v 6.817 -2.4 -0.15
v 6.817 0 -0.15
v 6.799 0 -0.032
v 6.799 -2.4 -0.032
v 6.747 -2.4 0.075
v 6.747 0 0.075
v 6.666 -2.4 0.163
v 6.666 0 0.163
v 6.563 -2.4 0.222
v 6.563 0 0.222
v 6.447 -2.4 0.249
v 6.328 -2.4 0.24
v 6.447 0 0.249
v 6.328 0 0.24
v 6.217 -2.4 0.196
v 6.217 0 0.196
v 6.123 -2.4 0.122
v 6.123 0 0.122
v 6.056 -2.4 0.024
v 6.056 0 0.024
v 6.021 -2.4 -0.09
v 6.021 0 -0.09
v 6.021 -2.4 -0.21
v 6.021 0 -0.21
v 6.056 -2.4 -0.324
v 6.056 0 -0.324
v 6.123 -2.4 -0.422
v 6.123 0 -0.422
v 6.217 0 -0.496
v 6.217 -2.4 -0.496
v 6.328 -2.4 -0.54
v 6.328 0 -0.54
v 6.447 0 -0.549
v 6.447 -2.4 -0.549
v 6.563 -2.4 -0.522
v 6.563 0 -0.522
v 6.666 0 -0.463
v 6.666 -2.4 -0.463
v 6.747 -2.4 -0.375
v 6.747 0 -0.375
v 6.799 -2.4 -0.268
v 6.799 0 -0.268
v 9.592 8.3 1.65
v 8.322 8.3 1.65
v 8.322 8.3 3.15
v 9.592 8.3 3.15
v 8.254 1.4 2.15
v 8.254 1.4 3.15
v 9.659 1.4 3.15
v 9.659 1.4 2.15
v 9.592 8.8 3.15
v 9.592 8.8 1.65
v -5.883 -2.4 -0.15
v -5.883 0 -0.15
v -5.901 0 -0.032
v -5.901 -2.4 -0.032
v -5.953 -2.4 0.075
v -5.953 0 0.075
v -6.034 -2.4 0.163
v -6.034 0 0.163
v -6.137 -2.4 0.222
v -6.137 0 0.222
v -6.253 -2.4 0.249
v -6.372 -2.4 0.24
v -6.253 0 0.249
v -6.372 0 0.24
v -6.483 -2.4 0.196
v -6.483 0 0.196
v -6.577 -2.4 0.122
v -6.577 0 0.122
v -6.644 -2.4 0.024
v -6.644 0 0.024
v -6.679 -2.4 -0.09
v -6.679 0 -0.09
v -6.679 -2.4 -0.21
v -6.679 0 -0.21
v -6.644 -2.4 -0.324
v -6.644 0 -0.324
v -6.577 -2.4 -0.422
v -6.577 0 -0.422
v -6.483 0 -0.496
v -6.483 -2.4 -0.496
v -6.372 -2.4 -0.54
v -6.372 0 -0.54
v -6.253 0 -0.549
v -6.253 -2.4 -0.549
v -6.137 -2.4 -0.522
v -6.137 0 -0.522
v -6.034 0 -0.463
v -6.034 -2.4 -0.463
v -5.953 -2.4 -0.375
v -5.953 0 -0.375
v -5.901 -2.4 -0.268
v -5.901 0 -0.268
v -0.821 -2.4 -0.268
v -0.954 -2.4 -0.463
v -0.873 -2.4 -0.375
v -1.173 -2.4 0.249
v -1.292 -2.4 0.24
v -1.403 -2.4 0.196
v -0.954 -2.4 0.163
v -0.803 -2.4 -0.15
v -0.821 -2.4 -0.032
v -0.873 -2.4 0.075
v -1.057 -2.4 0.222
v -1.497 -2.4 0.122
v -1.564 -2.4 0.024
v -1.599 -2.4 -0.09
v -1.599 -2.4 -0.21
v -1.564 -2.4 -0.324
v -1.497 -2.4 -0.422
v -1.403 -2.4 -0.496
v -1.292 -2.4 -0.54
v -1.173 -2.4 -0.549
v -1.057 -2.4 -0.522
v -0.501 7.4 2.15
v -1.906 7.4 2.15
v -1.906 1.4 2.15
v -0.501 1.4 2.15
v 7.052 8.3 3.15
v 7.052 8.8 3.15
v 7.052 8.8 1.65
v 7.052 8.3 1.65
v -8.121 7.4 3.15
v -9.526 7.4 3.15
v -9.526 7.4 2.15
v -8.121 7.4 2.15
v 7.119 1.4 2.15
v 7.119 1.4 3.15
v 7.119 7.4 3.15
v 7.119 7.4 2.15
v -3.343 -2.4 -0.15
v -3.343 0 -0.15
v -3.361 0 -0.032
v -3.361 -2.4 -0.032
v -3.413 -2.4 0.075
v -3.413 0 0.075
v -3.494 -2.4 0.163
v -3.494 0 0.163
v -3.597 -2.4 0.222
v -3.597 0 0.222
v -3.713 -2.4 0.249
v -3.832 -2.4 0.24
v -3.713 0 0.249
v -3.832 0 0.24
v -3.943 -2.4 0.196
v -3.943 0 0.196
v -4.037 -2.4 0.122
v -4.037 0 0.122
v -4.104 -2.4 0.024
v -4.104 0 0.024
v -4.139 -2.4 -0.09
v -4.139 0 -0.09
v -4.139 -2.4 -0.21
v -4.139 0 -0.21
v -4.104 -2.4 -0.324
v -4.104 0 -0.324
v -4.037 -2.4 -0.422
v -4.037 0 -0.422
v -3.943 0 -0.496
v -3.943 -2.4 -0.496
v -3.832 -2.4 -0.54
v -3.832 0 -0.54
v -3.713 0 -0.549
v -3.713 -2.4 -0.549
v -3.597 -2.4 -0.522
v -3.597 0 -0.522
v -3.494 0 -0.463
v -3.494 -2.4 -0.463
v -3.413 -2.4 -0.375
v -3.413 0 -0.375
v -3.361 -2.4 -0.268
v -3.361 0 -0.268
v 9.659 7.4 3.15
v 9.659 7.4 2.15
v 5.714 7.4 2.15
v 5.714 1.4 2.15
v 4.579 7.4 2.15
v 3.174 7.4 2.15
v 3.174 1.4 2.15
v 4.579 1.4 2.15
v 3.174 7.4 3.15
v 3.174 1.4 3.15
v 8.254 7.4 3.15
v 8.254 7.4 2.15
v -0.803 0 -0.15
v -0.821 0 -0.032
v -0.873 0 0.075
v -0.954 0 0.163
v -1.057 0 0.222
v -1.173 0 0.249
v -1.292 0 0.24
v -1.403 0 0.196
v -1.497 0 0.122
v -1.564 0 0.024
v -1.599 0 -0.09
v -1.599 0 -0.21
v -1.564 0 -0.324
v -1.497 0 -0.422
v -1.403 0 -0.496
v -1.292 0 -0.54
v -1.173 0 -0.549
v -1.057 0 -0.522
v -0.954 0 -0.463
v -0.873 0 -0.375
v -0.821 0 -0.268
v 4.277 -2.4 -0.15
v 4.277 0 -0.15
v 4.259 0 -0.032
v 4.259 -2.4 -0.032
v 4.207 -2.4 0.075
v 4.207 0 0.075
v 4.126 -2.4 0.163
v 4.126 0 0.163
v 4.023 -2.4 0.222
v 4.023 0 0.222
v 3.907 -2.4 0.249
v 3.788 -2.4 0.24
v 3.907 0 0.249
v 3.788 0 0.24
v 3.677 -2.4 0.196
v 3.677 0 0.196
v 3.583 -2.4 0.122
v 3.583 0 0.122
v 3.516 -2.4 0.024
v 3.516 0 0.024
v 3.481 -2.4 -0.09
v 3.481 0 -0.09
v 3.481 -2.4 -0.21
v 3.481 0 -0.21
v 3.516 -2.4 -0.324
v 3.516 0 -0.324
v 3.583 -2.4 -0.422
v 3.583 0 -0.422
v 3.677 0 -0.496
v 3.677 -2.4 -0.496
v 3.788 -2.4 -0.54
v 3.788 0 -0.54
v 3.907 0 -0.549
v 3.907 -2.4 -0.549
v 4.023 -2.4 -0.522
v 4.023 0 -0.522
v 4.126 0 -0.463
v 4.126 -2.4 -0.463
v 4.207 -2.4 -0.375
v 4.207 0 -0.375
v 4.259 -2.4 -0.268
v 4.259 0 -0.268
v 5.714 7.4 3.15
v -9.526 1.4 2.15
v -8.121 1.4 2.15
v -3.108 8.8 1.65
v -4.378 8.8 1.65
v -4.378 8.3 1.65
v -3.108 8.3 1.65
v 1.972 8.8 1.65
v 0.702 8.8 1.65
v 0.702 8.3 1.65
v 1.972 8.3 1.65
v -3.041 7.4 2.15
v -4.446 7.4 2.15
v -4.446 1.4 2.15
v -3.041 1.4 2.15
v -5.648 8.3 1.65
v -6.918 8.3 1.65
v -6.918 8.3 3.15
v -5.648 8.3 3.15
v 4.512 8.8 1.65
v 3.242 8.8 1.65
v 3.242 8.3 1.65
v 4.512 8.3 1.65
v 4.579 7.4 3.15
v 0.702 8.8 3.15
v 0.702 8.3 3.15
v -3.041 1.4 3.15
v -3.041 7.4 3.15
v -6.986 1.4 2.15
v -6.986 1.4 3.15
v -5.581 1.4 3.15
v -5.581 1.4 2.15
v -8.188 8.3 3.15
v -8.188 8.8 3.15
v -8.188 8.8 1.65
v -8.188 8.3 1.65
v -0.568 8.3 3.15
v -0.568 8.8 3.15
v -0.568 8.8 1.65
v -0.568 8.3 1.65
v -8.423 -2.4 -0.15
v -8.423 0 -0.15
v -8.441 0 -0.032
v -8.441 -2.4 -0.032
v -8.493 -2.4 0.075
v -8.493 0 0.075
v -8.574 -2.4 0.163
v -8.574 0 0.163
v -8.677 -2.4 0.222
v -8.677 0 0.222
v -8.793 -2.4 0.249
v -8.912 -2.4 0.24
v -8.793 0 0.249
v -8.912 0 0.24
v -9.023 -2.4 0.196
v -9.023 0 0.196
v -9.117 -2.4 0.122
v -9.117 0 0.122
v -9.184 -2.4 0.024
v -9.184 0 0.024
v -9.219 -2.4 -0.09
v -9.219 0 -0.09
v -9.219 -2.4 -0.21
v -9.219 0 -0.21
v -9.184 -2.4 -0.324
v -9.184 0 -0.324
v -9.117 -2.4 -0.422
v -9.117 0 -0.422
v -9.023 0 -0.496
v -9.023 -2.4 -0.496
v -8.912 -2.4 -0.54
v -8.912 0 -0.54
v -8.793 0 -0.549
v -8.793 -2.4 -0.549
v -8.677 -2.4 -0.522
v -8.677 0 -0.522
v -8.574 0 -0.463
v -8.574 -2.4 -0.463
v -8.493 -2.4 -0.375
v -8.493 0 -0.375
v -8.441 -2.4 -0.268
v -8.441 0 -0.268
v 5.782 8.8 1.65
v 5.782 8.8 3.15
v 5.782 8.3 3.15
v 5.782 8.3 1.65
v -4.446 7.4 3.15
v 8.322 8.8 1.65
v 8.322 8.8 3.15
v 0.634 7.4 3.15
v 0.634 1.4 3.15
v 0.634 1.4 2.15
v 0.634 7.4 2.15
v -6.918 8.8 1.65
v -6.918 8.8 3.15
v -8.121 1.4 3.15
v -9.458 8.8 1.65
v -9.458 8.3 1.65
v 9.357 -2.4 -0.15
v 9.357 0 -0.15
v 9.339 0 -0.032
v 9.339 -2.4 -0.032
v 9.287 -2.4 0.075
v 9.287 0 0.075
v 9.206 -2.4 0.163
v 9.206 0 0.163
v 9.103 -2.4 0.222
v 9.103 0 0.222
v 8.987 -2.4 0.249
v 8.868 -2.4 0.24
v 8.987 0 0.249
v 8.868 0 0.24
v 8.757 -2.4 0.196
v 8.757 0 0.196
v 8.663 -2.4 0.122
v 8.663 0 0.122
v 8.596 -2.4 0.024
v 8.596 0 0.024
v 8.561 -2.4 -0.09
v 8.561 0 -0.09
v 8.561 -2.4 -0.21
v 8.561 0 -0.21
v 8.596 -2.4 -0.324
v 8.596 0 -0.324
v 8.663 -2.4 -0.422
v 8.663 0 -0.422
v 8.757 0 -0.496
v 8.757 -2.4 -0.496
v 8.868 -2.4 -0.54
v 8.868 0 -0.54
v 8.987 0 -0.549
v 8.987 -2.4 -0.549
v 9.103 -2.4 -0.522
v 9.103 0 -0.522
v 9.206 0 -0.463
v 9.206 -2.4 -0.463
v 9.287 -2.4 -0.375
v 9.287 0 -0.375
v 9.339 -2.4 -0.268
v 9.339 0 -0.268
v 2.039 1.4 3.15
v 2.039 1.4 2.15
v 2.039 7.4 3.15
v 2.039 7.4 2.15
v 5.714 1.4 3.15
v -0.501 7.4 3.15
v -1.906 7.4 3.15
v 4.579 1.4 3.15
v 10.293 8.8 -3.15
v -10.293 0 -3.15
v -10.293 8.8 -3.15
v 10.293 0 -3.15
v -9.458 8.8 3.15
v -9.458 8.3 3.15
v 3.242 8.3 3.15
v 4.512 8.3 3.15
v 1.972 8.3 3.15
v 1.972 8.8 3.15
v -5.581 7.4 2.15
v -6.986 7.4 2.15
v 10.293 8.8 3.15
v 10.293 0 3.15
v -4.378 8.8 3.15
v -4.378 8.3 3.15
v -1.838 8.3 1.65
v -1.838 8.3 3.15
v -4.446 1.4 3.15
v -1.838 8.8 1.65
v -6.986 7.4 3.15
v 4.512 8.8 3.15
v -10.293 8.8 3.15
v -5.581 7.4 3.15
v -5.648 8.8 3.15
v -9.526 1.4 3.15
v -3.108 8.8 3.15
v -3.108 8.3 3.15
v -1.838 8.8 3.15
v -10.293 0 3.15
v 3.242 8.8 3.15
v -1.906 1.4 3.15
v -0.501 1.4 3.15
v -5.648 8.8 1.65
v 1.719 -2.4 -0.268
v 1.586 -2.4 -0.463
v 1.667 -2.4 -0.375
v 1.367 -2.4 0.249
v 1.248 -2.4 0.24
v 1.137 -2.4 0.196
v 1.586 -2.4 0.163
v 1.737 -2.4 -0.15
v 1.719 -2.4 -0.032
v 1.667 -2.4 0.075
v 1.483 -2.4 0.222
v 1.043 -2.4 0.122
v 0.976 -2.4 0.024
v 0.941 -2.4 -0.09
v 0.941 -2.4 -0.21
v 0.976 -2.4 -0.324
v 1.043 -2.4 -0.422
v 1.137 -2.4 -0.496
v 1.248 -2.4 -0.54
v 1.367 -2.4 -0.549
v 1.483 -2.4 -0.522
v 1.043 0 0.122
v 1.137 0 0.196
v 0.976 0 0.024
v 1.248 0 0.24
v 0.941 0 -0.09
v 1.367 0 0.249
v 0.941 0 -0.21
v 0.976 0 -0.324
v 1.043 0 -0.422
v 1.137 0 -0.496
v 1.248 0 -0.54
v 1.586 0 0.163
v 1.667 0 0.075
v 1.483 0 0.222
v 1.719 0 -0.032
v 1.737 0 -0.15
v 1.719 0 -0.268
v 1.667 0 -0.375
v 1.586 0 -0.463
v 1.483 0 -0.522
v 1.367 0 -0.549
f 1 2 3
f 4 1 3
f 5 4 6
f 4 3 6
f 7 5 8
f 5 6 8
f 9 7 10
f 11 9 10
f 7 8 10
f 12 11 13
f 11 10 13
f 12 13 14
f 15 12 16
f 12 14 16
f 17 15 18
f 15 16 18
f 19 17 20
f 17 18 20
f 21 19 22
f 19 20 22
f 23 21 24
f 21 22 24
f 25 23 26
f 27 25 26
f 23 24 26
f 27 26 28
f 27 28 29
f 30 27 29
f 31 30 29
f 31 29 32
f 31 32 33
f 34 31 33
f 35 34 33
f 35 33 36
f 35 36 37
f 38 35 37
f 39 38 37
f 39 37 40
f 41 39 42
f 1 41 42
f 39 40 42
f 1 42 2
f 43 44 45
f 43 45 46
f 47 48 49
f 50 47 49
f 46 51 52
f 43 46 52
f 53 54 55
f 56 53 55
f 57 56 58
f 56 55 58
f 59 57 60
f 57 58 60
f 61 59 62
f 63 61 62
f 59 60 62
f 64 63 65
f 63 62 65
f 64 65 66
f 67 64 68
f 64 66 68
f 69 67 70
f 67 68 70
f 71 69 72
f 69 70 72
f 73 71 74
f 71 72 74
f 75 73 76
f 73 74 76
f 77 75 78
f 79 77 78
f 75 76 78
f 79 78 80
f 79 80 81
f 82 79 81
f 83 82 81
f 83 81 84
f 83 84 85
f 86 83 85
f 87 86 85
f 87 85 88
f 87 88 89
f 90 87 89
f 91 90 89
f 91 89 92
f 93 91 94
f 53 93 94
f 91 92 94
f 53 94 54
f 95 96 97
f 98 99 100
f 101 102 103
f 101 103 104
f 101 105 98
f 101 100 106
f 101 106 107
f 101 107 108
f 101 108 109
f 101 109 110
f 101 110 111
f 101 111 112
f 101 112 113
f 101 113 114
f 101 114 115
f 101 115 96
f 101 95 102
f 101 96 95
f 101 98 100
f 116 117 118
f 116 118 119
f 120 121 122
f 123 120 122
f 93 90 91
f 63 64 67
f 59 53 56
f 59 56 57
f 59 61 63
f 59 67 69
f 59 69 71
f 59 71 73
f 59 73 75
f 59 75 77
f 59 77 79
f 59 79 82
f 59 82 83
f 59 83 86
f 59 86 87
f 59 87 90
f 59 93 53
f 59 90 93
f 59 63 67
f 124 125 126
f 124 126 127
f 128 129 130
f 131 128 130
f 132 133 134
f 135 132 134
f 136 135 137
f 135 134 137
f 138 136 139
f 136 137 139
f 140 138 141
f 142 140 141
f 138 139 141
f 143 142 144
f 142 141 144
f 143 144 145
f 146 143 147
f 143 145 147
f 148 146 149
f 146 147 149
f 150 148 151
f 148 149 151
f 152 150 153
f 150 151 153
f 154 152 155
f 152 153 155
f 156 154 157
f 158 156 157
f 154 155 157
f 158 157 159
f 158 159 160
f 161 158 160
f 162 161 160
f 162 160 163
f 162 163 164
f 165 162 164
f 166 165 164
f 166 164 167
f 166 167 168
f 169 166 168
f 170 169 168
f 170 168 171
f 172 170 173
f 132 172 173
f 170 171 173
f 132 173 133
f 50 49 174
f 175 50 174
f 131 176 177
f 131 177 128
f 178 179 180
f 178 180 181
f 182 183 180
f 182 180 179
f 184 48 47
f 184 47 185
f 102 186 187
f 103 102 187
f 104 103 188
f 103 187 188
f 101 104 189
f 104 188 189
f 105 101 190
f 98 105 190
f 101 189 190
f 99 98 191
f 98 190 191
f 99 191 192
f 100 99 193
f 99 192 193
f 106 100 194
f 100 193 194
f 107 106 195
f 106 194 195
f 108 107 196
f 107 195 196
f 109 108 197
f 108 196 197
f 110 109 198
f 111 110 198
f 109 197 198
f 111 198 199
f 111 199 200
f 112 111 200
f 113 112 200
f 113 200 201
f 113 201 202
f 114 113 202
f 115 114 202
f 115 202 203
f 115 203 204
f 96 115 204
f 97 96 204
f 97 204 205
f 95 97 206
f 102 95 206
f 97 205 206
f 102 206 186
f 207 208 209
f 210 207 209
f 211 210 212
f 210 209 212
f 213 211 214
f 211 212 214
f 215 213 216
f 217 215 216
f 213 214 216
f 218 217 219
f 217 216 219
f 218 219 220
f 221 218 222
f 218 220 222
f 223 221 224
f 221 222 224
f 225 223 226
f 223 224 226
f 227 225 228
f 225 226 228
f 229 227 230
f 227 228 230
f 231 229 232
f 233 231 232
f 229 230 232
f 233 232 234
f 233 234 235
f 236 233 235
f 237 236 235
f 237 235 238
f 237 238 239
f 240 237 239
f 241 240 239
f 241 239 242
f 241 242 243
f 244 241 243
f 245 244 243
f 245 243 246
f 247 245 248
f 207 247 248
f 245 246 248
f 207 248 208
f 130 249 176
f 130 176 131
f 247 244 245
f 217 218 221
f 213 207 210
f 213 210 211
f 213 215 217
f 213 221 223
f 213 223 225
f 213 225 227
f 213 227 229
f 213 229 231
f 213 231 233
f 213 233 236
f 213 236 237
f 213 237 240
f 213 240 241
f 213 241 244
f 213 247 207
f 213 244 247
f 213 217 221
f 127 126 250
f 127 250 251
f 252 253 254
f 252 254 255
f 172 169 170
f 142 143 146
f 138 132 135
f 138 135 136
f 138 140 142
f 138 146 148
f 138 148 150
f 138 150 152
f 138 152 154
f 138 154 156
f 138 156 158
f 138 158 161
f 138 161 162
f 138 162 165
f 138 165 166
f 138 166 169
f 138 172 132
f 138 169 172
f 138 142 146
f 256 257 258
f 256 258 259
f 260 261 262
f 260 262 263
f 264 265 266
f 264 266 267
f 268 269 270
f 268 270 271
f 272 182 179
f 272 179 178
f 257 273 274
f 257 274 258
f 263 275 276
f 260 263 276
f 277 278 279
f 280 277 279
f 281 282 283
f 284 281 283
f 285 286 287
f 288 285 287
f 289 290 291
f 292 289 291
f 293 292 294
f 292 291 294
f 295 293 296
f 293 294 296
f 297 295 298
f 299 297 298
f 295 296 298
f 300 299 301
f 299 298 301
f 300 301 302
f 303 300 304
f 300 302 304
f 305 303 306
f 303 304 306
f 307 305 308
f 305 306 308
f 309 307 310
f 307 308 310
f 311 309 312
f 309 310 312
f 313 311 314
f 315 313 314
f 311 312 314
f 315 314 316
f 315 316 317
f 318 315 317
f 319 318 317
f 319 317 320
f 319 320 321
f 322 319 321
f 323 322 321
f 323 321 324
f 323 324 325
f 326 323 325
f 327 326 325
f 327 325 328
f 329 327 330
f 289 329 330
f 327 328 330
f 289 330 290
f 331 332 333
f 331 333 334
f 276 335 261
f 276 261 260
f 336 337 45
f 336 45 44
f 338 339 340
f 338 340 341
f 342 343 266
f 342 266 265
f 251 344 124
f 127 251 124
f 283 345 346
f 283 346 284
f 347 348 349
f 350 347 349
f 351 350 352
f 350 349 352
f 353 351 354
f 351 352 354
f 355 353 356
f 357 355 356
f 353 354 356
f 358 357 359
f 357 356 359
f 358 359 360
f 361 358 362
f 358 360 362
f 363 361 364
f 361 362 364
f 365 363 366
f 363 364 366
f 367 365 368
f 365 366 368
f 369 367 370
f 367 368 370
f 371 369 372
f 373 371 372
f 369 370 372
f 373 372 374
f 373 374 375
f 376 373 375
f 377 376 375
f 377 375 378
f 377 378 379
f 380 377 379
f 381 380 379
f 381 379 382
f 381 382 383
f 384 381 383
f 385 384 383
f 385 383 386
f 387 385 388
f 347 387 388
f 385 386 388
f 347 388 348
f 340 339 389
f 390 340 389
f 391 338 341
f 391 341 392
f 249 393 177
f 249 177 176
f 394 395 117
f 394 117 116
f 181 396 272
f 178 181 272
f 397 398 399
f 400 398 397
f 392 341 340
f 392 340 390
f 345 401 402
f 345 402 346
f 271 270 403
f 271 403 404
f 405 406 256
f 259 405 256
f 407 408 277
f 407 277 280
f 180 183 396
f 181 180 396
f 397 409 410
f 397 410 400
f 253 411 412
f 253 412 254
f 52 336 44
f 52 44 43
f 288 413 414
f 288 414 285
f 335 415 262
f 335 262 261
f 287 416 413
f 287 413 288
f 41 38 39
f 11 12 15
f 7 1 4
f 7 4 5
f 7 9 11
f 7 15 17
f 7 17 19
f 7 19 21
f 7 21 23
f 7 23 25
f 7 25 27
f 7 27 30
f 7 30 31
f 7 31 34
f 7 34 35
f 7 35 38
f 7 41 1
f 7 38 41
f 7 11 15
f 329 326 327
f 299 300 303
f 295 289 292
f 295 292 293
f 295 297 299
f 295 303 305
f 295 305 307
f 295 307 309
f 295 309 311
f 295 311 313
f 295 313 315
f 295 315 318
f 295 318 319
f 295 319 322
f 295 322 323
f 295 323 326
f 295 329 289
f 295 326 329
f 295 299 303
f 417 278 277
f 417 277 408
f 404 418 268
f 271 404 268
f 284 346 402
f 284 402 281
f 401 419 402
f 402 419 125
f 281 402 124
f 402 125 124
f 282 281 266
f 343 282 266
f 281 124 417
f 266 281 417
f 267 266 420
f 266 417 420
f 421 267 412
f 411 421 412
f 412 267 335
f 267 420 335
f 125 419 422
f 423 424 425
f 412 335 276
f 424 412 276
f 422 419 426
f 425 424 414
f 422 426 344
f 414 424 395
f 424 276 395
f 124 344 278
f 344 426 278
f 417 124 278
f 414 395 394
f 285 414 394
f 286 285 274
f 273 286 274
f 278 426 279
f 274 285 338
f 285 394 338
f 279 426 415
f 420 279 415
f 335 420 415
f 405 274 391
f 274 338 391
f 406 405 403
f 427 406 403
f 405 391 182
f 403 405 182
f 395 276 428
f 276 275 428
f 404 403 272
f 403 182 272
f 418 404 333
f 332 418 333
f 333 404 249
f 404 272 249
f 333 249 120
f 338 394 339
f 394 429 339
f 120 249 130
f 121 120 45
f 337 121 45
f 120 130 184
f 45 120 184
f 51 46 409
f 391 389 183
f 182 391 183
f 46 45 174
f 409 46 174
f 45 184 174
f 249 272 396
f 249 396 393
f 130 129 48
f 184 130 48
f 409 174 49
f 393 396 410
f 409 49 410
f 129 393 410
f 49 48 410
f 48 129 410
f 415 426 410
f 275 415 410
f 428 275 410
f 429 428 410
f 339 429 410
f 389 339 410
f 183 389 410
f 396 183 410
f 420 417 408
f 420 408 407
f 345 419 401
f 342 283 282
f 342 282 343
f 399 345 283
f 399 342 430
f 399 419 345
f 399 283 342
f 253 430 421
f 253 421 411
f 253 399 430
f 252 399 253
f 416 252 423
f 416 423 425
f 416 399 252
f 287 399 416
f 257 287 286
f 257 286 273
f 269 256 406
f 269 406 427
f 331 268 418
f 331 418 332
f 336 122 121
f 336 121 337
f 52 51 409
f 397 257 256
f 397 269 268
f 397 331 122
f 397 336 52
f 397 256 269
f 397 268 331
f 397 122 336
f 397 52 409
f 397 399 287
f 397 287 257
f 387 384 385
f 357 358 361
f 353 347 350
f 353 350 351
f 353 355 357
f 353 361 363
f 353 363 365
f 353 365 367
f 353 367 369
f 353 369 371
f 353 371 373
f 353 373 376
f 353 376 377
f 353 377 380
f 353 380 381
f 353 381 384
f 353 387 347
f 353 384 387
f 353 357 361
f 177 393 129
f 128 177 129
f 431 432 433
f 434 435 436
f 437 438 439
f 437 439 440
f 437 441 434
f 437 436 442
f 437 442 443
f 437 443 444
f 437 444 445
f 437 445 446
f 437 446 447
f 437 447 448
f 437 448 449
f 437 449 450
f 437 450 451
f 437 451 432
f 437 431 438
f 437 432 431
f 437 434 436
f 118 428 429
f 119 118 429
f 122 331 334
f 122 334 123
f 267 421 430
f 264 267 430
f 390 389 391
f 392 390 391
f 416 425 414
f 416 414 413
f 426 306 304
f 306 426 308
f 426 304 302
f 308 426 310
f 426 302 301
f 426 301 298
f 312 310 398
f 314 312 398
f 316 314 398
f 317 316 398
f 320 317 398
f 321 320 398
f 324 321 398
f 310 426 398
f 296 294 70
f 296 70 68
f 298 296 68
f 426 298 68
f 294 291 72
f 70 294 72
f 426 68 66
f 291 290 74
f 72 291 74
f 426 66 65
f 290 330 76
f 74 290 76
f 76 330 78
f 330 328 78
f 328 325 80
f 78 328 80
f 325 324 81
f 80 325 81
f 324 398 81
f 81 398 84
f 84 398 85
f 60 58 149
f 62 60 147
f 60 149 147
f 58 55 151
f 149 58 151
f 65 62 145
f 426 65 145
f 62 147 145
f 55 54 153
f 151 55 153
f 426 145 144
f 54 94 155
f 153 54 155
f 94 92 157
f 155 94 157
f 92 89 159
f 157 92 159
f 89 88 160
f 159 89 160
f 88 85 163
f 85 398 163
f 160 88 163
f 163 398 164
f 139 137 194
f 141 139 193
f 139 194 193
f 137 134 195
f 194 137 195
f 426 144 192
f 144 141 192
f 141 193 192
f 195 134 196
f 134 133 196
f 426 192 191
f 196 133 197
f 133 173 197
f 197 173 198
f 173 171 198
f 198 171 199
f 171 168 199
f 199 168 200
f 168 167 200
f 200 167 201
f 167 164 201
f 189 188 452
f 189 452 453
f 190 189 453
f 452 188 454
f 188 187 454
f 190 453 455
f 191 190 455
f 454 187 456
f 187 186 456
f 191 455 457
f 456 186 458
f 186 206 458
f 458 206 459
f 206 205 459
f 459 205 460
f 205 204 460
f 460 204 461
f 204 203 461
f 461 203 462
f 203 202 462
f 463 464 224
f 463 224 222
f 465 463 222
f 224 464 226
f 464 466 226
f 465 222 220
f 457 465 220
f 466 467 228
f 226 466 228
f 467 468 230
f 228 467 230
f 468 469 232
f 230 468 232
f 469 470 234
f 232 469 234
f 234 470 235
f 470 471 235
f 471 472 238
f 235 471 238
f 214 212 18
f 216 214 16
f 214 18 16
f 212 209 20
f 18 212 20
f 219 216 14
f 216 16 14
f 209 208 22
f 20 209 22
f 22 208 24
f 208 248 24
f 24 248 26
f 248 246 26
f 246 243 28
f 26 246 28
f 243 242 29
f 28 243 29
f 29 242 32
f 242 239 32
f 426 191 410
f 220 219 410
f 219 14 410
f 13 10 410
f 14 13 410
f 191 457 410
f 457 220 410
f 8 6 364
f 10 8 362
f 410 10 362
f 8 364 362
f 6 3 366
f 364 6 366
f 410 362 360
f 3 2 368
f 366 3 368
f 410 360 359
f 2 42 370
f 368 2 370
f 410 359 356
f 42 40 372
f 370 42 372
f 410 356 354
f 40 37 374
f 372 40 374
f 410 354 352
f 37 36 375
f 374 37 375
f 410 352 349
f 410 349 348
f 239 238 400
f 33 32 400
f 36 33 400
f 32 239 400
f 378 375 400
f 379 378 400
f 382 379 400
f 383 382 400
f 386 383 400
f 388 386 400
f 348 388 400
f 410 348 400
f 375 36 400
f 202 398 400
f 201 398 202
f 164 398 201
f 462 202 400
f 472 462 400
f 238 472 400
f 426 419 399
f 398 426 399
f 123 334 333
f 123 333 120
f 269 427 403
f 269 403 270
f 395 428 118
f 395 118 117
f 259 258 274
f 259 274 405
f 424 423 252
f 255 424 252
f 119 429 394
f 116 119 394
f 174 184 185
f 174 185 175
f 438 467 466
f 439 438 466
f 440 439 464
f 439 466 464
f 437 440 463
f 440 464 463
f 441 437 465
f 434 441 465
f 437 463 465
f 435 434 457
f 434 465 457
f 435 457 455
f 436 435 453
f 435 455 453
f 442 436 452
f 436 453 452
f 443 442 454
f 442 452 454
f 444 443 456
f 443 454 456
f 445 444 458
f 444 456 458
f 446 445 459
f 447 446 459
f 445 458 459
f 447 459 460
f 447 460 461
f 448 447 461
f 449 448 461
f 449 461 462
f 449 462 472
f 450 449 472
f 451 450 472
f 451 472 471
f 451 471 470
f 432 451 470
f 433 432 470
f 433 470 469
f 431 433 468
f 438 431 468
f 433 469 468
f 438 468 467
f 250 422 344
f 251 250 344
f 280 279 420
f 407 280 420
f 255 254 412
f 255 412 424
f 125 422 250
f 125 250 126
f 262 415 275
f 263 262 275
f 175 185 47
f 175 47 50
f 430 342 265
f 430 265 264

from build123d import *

# Parameters (mm, degrees)
SKETCH2_W           = 20.586666666
SKETCH2_H           = 6.3
BOSS_EXTRUDE1_DEPTH = 8.8
SKETCH3_R           = 0.4
BOSS_EXTRUDE2_DEPTH = 2.4
SKETCH4_W           = 1.405361948
SKETCH4_H           = 6
CUT_EXTRUDE1_DEPTH  = 1
SKETCH5_W           = 1.27
SKETCH5_H           = 1.5
CUT_EXTRUDE2_DEPTH  = 0.5
LPATTERN1_COUNT     = 8
LPATTERN1_PITCH     = 2.54


with BuildPart() as part:
    # Sketch2 → Boss-Extrude1 (new body)
    with BuildSketch(Plane(origin=(0, 0, 0), x_dir=(1, 0, 0), z_dir=(0, 1, 0))):
        Rectangle(SKETCH2_W, SKETCH2_H)
    extrude(amount=BOSS_EXTRUDE1_DEPTH)

    # Sketch3 → Boss-Extrude2 (add)
    with BuildSketch(Plane.XZ):
        with Locations((-8.823333333, -0.15)):
            Circle(SKETCH3_R)
    boss_extrude2 = extrude(amount=BOSS_EXTRUDE2_DEPTH)

    # Sketch4 → Cut-Extrude1 (cut)
    with BuildSketch(Plane.XY.offset(3.15)):
        with Locations((-8.823333333, 4.4)):
            Rectangle(SKETCH4_W, SKETCH4_H)
    cut_extrude1 = extrude(amount=-CUT_EXTRUDE1_DEPTH, mode=Mode.SUBTRACT)

    # Sketch5 → Cut-Extrude2 (cut)
    with BuildSketch(Plane(origin=(0, 8.8, 0), x_dir=(1, 0, 0), z_dir=(0, 1, 0))):
        with Locations((-8.823333333, -2.4)):
            Rectangle(SKETCH5_W, SKETCH5_H)
    cut_extrude2 = extrude(amount=-CUT_EXTRUDE2_DEPTH, mode=Mode.SUBTRACT)

    # LPattern1: Boss-Extrude2, Cut-Extrude1, Cut-Extrude2 ×8
    with Locations(*[(i * LPATTERN1_PITCH, 0, 0) for i in range(1, LPATTERN1_COUNT)]):
        add(boss_extrude2)
        add(cut_extrude1, mode=Mode.SUBTRACT)
        add(cut_extrude2, mode=Mode.SUBTRACT)


solid = part.part
